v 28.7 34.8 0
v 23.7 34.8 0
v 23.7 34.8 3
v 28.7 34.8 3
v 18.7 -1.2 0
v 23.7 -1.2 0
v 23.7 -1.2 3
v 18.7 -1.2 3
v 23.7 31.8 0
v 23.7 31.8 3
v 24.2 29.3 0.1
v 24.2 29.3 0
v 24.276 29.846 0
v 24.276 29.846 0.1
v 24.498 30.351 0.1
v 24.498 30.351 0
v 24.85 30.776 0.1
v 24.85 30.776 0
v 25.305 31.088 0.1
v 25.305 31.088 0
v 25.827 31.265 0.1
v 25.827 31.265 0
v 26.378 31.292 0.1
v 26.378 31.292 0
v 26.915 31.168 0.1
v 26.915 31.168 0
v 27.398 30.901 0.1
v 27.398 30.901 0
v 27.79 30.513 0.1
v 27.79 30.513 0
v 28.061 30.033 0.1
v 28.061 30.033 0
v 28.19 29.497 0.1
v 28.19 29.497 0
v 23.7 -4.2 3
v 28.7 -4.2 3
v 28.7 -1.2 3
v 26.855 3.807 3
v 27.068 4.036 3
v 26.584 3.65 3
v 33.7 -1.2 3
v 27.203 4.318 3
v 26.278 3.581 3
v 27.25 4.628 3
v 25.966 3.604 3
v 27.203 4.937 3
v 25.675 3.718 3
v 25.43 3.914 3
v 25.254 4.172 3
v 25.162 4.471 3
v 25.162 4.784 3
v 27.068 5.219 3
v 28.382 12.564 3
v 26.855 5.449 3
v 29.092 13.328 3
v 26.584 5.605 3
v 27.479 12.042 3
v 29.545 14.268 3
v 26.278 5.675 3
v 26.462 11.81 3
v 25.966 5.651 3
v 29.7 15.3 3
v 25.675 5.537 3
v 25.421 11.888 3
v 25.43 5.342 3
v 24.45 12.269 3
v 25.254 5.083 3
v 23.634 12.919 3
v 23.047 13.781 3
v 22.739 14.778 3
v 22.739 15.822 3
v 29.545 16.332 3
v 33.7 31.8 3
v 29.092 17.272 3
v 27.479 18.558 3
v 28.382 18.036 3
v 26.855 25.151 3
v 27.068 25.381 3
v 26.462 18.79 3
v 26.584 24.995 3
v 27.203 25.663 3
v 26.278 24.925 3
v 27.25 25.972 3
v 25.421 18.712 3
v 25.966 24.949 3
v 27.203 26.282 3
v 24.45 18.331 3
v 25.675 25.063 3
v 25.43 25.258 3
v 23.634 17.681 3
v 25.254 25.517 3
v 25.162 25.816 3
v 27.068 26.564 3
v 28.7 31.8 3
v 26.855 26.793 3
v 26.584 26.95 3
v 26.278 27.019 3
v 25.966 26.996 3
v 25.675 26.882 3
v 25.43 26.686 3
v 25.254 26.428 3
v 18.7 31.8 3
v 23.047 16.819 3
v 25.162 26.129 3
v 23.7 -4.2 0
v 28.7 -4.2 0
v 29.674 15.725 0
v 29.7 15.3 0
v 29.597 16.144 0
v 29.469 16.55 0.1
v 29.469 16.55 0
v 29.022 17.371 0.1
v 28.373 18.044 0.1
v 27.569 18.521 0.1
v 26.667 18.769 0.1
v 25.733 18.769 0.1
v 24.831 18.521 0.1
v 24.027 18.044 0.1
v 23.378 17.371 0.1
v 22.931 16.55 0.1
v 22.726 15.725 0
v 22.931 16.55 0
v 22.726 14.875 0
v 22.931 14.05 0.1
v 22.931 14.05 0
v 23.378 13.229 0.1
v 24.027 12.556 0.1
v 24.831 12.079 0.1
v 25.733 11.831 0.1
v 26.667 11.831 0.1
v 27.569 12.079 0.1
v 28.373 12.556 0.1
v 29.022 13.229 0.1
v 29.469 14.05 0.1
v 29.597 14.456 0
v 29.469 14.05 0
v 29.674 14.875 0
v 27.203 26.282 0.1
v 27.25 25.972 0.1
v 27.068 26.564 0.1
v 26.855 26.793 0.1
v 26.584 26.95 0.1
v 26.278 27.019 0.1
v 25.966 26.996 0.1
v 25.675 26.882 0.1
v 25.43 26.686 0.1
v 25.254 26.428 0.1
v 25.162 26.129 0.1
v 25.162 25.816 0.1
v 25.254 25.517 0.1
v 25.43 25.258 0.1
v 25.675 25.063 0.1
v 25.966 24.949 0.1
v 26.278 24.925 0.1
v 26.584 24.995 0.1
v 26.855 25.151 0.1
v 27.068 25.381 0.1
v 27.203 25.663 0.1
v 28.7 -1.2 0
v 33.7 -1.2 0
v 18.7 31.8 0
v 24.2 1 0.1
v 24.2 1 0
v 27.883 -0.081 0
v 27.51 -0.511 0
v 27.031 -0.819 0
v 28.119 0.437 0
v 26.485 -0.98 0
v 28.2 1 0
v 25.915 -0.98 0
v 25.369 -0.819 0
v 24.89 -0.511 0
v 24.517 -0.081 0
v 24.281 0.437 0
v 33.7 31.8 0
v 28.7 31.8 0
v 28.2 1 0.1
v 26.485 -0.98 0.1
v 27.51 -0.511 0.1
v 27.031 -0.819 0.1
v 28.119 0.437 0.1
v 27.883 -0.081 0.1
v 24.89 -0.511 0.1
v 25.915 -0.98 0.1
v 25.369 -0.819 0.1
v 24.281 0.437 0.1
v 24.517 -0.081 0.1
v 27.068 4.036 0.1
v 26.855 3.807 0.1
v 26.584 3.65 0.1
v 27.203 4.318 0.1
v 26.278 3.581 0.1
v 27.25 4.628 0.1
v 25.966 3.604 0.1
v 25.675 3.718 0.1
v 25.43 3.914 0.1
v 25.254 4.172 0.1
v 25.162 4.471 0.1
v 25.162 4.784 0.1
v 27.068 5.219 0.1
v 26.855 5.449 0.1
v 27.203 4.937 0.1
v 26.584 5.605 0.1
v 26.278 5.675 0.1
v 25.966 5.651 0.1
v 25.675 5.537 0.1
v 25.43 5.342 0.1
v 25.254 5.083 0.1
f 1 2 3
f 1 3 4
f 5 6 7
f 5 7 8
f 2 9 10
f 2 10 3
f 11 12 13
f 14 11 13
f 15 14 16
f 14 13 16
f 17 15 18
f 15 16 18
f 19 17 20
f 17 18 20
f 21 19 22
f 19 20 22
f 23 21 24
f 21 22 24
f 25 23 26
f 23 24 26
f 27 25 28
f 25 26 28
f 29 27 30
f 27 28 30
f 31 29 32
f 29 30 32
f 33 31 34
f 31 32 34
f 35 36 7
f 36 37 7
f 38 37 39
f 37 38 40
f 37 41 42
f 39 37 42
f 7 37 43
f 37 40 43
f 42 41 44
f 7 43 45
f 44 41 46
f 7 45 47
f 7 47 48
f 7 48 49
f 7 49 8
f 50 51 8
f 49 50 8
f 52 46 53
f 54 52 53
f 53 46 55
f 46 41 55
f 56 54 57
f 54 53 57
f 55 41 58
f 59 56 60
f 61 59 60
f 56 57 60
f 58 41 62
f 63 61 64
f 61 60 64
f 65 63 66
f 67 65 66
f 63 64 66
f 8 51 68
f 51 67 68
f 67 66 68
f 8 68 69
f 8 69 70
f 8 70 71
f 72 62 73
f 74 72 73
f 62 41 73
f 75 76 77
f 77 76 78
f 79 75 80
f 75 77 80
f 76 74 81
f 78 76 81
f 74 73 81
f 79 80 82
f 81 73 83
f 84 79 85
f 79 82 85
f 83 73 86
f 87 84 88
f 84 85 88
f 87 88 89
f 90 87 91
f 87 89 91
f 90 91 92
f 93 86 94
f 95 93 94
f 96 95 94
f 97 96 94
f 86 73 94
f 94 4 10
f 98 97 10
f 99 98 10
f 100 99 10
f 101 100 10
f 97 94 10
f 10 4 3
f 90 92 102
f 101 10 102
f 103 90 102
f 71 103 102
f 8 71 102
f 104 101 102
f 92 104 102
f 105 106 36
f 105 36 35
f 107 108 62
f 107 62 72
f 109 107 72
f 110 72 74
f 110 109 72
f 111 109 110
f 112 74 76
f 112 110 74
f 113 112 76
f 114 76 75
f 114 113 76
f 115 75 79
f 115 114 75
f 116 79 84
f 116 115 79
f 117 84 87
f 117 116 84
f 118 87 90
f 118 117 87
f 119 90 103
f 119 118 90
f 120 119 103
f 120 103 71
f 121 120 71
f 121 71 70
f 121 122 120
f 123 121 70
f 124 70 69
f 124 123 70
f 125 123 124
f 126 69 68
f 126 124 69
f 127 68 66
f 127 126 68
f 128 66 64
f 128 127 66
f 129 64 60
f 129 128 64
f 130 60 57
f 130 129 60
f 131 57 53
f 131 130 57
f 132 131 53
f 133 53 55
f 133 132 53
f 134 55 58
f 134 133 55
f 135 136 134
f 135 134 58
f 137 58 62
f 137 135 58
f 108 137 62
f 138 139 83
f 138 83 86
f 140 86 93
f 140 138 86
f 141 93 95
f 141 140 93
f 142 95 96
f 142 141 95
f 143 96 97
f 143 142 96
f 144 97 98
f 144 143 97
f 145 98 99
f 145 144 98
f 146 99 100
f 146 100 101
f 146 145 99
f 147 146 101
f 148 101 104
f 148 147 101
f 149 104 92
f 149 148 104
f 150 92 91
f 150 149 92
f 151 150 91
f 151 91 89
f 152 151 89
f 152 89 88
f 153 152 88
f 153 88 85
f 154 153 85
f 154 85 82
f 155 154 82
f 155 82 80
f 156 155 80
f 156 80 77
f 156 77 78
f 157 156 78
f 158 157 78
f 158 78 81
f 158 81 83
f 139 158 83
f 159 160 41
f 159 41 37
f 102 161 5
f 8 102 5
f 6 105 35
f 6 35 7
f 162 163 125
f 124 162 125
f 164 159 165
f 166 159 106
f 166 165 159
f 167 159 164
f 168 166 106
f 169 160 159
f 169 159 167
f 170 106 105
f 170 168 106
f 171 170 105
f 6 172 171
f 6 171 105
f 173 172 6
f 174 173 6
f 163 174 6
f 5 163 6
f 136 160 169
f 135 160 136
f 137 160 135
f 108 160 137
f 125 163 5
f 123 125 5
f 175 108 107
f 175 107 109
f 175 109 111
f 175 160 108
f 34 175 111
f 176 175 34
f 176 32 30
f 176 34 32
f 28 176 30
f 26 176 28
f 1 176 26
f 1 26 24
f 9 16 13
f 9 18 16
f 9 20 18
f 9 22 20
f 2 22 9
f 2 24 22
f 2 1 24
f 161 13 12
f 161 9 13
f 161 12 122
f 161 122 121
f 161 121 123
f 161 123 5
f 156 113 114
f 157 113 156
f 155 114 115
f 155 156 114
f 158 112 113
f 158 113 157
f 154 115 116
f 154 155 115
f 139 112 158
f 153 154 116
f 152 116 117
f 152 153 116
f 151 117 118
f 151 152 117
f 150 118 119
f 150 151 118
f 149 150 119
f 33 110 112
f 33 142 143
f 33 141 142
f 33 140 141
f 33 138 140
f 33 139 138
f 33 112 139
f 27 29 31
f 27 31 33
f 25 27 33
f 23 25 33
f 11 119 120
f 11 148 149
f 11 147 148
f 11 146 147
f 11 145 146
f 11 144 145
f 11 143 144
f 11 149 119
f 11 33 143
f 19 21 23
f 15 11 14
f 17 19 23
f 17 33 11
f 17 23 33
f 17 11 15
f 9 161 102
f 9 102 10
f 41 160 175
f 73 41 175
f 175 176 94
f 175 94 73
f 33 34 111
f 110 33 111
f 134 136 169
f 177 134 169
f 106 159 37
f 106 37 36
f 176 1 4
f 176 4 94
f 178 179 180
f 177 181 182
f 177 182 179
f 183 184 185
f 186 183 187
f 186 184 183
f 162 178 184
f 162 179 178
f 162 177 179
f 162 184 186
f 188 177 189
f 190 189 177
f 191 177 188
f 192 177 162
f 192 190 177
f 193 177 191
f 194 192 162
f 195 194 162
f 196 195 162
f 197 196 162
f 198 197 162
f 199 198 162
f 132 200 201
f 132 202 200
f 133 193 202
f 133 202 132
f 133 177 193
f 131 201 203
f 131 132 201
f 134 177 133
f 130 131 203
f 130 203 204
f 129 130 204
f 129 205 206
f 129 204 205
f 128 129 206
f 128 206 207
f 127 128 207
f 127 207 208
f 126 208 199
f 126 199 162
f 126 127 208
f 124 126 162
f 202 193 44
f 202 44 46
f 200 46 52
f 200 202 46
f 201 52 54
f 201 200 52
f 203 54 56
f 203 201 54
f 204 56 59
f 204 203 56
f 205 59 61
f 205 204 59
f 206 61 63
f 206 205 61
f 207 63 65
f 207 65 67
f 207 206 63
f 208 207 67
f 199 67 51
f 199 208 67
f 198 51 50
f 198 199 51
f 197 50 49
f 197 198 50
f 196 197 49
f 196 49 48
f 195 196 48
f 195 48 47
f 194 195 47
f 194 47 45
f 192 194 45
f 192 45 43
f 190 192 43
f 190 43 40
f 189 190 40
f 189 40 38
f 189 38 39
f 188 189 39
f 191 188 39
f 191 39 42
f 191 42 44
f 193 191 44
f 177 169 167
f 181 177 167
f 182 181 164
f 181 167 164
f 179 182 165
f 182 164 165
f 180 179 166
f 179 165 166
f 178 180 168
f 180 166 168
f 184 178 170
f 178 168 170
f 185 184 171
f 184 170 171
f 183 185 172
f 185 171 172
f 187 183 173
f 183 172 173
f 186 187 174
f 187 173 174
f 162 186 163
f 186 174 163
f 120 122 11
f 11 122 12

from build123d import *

# Parameters (mm, degrees)
CORTE_EXTERIOR_R        = 1.05
CORTE_EXTERIOR_R_2      = 3.5
SALIENTE_EXTRUIR1_DEPTH = 3
CORTAR_EXTRUIR1_DEPTH   = 0.1


with BuildPart() as part:
    # Corte exterior → Saliente-Extruir1 (new body)
    with BuildSketch(Plane.XY):
        Polygon((28.7, -4.2), (23.7, -4.2), (23.7, -1.2), (18.7, -1.2), (18.7, 9.8), (18.7, 31.8), (23.7, 31.8), (23.7, 34.8), (28.7, 34.8), (28.7, 31.8), (33.7, 31.8), (33.7, 15.8), (33.7, -1.2), (28.7, -1.2), align=None)
        with Locations((26.2, 25.972229454)):
            Circle(CORTE_EXTERIOR_R, mode=Mode.SUBTRACT)
        with Locations((26.2, 4.627770547)):
            Circle(CORTE_EXTERIOR_R, mode=Mode.SUBTRACT)
        with Locations((26.2, 15.3)):
            Circle(CORTE_EXTERIOR_R_2, mode=Mode.SUBTRACT)
    extrude(amount=SALIENTE_EXTRUIR1_DEPTH)

    # Grabado Superficie → Cortar-Extruir1 (cut)
    with BuildSketch(Plane.XY):
        with BuildLine():
            Line((22.930825792, 16.55), (24.2, 29.3))
            ThreePointArc((24.2, 29.3), (26.101579532, 31.297576885), (28.190313411, 29.496602453))
            Line((28.190313411, 29.496602453), (29.469174208, 16.55))
            ThreePointArc((29.469174208, 16.55), (26.2, 18.8), (22.930825792, 16.55))
        make_face()
        with BuildLine():
            Line((29.469174208, 14.05), (28.2, 1))
            ThreePointArc((28.2, 1), (26.2, -1), (24.2, 1))
            Line((24.2, 1), (22.930825792, 14.05))
            ThreePointArc((22.930825792, 14.05), (26.2, 11.8), (29.469174208, 14.05))
        make_face()
    extrude(amount=CORTAR_EXTRUIR1_DEPTH, mode=Mode.SUBTRACT)


solid = part.part
